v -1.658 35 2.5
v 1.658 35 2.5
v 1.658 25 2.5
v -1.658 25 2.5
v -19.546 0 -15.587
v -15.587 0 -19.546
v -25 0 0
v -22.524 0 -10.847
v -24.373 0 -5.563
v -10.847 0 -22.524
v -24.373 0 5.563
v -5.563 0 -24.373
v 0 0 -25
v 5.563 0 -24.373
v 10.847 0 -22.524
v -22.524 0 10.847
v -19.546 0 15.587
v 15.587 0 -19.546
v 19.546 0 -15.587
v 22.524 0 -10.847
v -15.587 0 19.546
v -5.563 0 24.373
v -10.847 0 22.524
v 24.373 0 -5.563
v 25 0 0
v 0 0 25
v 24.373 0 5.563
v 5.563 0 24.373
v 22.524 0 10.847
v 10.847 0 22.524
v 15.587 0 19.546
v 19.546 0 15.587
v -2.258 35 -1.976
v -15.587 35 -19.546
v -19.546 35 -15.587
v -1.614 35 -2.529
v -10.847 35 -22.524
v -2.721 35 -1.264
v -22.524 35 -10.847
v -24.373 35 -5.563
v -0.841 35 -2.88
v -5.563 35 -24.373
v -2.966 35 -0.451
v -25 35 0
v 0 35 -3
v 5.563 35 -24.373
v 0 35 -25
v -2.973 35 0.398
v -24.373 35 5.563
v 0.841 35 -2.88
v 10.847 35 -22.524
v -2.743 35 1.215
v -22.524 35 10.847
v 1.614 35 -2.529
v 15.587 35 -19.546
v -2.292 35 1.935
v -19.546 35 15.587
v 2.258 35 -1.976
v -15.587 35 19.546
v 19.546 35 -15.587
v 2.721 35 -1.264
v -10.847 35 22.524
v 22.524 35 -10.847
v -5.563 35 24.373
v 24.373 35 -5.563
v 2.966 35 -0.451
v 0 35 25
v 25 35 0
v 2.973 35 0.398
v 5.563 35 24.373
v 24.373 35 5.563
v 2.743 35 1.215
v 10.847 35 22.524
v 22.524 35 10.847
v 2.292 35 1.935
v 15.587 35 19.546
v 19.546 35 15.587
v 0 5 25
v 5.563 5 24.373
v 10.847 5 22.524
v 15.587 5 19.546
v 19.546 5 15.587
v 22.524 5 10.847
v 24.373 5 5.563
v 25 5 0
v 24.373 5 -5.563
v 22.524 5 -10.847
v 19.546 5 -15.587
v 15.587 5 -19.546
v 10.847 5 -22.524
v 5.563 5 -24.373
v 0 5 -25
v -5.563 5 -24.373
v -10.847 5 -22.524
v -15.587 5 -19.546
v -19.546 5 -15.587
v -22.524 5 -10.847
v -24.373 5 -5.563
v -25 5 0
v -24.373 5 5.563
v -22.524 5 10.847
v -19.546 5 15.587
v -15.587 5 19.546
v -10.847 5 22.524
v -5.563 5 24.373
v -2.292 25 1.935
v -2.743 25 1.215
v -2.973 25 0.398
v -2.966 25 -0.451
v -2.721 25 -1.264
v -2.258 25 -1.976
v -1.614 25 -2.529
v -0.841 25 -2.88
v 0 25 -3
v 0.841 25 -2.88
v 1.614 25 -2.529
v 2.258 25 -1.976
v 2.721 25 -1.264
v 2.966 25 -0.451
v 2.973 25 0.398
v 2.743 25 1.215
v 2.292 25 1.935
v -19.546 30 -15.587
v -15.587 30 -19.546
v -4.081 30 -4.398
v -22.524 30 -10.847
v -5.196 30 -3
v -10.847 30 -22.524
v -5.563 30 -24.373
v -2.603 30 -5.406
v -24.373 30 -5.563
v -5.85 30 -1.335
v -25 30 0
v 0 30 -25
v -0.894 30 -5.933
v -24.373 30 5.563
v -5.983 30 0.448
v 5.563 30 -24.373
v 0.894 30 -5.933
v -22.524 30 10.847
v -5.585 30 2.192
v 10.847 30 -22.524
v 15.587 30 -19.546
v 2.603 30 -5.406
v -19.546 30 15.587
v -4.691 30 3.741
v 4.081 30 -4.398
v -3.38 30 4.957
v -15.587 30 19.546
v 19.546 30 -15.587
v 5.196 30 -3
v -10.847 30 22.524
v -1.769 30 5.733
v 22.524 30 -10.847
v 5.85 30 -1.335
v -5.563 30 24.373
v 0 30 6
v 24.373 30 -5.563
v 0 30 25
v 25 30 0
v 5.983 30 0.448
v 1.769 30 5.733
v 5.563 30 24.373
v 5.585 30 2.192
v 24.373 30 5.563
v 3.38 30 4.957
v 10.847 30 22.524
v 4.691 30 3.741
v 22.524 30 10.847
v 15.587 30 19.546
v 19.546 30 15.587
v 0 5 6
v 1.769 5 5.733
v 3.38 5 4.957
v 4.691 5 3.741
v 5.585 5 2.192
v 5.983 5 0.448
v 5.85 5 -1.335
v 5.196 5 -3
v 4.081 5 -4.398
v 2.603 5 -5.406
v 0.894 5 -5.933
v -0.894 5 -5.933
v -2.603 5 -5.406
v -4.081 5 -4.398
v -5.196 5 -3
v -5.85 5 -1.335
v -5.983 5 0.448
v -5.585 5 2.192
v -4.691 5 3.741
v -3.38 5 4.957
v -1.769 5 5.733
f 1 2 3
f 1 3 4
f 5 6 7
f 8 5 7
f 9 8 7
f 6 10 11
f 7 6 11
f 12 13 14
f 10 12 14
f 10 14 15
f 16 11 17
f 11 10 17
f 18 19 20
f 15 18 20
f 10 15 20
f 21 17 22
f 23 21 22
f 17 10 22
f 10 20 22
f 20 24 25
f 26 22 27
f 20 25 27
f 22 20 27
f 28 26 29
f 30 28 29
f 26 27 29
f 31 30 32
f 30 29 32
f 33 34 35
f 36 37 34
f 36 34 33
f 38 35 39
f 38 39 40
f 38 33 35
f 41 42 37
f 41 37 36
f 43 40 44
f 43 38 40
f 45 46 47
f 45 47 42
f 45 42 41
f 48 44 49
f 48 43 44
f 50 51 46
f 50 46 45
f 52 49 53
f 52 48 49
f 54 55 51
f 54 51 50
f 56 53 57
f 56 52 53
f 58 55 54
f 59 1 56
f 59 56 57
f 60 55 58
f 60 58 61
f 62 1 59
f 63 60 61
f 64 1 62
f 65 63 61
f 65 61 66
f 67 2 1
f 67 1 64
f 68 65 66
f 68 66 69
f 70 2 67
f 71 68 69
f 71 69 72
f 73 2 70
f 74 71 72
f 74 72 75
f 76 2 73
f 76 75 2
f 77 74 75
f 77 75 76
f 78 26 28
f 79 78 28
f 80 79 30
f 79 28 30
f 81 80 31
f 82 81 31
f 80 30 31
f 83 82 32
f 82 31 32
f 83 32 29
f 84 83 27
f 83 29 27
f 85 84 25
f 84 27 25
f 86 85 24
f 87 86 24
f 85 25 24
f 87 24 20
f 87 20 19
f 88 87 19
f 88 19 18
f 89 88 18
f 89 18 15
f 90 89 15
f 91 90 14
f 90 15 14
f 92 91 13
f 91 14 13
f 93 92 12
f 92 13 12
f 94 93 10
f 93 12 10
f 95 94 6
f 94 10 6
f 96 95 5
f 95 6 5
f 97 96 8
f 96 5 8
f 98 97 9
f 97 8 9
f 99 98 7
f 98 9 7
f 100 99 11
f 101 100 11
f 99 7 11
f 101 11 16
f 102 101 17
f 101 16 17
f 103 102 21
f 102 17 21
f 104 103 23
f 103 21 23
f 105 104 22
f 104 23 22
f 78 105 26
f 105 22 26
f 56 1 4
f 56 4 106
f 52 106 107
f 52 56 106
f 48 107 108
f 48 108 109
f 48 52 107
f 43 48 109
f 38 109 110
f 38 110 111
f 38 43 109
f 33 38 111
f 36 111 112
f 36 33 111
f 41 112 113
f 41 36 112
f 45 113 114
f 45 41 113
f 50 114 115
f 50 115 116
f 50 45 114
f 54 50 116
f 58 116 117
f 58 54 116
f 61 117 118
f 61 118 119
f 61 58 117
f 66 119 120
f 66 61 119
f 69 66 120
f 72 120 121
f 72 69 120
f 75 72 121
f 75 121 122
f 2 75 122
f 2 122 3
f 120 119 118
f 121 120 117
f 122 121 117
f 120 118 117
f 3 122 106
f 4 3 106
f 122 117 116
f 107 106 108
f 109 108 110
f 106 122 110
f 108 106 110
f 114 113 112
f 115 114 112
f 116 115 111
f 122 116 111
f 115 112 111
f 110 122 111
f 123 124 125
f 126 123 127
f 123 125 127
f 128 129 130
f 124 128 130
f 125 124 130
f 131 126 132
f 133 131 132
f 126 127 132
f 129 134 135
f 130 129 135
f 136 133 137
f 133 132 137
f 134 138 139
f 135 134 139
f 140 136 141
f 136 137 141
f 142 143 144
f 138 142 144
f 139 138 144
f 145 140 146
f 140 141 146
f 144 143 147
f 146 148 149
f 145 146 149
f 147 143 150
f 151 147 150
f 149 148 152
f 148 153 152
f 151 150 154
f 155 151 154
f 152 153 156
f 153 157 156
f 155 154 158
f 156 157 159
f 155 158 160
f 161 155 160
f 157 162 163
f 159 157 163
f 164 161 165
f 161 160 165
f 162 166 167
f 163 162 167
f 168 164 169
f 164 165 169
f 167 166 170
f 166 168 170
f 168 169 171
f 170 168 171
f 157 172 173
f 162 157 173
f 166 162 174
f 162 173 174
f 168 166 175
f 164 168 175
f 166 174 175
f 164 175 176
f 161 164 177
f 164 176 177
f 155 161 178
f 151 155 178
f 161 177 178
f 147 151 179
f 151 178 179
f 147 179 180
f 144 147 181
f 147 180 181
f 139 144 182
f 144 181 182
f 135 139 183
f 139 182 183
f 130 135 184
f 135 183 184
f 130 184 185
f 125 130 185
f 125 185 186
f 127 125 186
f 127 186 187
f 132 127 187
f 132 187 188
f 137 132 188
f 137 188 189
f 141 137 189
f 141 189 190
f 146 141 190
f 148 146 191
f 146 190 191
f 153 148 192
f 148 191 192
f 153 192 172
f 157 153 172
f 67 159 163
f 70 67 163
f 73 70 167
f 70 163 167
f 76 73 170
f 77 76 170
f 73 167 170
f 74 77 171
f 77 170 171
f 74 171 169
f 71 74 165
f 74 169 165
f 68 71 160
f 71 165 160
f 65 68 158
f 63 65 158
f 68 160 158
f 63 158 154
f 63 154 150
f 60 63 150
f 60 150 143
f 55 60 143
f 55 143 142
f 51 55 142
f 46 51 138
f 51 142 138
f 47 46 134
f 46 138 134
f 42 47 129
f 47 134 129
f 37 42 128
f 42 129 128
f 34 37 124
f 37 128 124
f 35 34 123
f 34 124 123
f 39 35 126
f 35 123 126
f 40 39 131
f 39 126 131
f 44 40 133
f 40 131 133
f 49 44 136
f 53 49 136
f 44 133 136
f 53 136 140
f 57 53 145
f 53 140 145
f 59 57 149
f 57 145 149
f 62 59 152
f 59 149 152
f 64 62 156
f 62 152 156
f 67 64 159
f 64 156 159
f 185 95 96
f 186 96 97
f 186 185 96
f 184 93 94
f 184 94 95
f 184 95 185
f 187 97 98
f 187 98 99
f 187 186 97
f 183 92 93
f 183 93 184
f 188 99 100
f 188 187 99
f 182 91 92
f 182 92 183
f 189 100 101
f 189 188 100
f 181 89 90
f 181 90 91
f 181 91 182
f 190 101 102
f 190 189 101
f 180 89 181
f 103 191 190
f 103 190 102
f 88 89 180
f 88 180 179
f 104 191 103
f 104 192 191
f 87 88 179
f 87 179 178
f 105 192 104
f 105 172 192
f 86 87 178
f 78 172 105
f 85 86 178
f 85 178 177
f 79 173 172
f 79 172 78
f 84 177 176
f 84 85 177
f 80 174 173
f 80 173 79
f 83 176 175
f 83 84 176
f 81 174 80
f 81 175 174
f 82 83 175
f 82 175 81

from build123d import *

# Parameters (mm, degrees)
SKETCH1_R           = 25
BOSS_EXTRUDE1_DEPTH = 5
SKETCH2_R           = 6
BOSS_EXTRUDE2_DEPTH = 25
SKETCH3_R           = 25
BOSS_EXTRUDE3_DEPTH = 5
CUT_EXTRUDE1_DEPTH  = 10


with BuildPart() as part:
    # Sketch1 → Boss-Extrude1 (new body)
    with BuildSketch(Plane(origin=(0, 0, 0), x_dir=(1, 0, 0), z_dir=(0, 1, 0))):
        with Locations(Location((0, 0, 0), (0, 0, 270))):
            Circle(SKETCH1_R)
    extrude(amount=BOSS_EXTRUDE1_DEPTH)

    # Sketch2 → Boss-Extrude2 (add)
    with BuildSketch(Plane(origin=(0, 5, 0), x_dir=(1, 0, 0), z_dir=(0, 1, 0))):
        with Locations(Location((0, 0, 0), (0, 0, 270))):
            Circle(SKETCH2_R)
    extrude(amount=BOSS_EXTRUDE2_DEPTH)

    # Sketch3 → Boss-Extrude3 (add)
    with BuildSketch(Plane(origin=(0, 30, 0), x_dir=(1, 0, 0), z_dir=(0, 1, 0))):
        with Locations(Location((0, 0, 0), (0, 0, 270))):
            Circle(SKETCH3_R)
    extrude(amount=BOSS_EXTRUDE3_DEPTH)

    # Sketch4 → Cut-Extrude1 (cut)
    with BuildSketch(Plane(origin=(0, 35, 0), x_dir=(1, 0, 0), z_dir=(0, 1, 0))):
        with BuildLine():
            Line((0, -2.5), (-1.658312395, -2.5))
            ThreePointArc((-1.658312395, -2.5), (0, 3), (1.658312395, -2.5))
            Line((1.658312395, -2.5), (0, -2.5))
        make_face()
    extrude(amount=-CUT_EXTRUDE1_DEPTH, mode=Mode.SUBTRACT)


solid = part.part
